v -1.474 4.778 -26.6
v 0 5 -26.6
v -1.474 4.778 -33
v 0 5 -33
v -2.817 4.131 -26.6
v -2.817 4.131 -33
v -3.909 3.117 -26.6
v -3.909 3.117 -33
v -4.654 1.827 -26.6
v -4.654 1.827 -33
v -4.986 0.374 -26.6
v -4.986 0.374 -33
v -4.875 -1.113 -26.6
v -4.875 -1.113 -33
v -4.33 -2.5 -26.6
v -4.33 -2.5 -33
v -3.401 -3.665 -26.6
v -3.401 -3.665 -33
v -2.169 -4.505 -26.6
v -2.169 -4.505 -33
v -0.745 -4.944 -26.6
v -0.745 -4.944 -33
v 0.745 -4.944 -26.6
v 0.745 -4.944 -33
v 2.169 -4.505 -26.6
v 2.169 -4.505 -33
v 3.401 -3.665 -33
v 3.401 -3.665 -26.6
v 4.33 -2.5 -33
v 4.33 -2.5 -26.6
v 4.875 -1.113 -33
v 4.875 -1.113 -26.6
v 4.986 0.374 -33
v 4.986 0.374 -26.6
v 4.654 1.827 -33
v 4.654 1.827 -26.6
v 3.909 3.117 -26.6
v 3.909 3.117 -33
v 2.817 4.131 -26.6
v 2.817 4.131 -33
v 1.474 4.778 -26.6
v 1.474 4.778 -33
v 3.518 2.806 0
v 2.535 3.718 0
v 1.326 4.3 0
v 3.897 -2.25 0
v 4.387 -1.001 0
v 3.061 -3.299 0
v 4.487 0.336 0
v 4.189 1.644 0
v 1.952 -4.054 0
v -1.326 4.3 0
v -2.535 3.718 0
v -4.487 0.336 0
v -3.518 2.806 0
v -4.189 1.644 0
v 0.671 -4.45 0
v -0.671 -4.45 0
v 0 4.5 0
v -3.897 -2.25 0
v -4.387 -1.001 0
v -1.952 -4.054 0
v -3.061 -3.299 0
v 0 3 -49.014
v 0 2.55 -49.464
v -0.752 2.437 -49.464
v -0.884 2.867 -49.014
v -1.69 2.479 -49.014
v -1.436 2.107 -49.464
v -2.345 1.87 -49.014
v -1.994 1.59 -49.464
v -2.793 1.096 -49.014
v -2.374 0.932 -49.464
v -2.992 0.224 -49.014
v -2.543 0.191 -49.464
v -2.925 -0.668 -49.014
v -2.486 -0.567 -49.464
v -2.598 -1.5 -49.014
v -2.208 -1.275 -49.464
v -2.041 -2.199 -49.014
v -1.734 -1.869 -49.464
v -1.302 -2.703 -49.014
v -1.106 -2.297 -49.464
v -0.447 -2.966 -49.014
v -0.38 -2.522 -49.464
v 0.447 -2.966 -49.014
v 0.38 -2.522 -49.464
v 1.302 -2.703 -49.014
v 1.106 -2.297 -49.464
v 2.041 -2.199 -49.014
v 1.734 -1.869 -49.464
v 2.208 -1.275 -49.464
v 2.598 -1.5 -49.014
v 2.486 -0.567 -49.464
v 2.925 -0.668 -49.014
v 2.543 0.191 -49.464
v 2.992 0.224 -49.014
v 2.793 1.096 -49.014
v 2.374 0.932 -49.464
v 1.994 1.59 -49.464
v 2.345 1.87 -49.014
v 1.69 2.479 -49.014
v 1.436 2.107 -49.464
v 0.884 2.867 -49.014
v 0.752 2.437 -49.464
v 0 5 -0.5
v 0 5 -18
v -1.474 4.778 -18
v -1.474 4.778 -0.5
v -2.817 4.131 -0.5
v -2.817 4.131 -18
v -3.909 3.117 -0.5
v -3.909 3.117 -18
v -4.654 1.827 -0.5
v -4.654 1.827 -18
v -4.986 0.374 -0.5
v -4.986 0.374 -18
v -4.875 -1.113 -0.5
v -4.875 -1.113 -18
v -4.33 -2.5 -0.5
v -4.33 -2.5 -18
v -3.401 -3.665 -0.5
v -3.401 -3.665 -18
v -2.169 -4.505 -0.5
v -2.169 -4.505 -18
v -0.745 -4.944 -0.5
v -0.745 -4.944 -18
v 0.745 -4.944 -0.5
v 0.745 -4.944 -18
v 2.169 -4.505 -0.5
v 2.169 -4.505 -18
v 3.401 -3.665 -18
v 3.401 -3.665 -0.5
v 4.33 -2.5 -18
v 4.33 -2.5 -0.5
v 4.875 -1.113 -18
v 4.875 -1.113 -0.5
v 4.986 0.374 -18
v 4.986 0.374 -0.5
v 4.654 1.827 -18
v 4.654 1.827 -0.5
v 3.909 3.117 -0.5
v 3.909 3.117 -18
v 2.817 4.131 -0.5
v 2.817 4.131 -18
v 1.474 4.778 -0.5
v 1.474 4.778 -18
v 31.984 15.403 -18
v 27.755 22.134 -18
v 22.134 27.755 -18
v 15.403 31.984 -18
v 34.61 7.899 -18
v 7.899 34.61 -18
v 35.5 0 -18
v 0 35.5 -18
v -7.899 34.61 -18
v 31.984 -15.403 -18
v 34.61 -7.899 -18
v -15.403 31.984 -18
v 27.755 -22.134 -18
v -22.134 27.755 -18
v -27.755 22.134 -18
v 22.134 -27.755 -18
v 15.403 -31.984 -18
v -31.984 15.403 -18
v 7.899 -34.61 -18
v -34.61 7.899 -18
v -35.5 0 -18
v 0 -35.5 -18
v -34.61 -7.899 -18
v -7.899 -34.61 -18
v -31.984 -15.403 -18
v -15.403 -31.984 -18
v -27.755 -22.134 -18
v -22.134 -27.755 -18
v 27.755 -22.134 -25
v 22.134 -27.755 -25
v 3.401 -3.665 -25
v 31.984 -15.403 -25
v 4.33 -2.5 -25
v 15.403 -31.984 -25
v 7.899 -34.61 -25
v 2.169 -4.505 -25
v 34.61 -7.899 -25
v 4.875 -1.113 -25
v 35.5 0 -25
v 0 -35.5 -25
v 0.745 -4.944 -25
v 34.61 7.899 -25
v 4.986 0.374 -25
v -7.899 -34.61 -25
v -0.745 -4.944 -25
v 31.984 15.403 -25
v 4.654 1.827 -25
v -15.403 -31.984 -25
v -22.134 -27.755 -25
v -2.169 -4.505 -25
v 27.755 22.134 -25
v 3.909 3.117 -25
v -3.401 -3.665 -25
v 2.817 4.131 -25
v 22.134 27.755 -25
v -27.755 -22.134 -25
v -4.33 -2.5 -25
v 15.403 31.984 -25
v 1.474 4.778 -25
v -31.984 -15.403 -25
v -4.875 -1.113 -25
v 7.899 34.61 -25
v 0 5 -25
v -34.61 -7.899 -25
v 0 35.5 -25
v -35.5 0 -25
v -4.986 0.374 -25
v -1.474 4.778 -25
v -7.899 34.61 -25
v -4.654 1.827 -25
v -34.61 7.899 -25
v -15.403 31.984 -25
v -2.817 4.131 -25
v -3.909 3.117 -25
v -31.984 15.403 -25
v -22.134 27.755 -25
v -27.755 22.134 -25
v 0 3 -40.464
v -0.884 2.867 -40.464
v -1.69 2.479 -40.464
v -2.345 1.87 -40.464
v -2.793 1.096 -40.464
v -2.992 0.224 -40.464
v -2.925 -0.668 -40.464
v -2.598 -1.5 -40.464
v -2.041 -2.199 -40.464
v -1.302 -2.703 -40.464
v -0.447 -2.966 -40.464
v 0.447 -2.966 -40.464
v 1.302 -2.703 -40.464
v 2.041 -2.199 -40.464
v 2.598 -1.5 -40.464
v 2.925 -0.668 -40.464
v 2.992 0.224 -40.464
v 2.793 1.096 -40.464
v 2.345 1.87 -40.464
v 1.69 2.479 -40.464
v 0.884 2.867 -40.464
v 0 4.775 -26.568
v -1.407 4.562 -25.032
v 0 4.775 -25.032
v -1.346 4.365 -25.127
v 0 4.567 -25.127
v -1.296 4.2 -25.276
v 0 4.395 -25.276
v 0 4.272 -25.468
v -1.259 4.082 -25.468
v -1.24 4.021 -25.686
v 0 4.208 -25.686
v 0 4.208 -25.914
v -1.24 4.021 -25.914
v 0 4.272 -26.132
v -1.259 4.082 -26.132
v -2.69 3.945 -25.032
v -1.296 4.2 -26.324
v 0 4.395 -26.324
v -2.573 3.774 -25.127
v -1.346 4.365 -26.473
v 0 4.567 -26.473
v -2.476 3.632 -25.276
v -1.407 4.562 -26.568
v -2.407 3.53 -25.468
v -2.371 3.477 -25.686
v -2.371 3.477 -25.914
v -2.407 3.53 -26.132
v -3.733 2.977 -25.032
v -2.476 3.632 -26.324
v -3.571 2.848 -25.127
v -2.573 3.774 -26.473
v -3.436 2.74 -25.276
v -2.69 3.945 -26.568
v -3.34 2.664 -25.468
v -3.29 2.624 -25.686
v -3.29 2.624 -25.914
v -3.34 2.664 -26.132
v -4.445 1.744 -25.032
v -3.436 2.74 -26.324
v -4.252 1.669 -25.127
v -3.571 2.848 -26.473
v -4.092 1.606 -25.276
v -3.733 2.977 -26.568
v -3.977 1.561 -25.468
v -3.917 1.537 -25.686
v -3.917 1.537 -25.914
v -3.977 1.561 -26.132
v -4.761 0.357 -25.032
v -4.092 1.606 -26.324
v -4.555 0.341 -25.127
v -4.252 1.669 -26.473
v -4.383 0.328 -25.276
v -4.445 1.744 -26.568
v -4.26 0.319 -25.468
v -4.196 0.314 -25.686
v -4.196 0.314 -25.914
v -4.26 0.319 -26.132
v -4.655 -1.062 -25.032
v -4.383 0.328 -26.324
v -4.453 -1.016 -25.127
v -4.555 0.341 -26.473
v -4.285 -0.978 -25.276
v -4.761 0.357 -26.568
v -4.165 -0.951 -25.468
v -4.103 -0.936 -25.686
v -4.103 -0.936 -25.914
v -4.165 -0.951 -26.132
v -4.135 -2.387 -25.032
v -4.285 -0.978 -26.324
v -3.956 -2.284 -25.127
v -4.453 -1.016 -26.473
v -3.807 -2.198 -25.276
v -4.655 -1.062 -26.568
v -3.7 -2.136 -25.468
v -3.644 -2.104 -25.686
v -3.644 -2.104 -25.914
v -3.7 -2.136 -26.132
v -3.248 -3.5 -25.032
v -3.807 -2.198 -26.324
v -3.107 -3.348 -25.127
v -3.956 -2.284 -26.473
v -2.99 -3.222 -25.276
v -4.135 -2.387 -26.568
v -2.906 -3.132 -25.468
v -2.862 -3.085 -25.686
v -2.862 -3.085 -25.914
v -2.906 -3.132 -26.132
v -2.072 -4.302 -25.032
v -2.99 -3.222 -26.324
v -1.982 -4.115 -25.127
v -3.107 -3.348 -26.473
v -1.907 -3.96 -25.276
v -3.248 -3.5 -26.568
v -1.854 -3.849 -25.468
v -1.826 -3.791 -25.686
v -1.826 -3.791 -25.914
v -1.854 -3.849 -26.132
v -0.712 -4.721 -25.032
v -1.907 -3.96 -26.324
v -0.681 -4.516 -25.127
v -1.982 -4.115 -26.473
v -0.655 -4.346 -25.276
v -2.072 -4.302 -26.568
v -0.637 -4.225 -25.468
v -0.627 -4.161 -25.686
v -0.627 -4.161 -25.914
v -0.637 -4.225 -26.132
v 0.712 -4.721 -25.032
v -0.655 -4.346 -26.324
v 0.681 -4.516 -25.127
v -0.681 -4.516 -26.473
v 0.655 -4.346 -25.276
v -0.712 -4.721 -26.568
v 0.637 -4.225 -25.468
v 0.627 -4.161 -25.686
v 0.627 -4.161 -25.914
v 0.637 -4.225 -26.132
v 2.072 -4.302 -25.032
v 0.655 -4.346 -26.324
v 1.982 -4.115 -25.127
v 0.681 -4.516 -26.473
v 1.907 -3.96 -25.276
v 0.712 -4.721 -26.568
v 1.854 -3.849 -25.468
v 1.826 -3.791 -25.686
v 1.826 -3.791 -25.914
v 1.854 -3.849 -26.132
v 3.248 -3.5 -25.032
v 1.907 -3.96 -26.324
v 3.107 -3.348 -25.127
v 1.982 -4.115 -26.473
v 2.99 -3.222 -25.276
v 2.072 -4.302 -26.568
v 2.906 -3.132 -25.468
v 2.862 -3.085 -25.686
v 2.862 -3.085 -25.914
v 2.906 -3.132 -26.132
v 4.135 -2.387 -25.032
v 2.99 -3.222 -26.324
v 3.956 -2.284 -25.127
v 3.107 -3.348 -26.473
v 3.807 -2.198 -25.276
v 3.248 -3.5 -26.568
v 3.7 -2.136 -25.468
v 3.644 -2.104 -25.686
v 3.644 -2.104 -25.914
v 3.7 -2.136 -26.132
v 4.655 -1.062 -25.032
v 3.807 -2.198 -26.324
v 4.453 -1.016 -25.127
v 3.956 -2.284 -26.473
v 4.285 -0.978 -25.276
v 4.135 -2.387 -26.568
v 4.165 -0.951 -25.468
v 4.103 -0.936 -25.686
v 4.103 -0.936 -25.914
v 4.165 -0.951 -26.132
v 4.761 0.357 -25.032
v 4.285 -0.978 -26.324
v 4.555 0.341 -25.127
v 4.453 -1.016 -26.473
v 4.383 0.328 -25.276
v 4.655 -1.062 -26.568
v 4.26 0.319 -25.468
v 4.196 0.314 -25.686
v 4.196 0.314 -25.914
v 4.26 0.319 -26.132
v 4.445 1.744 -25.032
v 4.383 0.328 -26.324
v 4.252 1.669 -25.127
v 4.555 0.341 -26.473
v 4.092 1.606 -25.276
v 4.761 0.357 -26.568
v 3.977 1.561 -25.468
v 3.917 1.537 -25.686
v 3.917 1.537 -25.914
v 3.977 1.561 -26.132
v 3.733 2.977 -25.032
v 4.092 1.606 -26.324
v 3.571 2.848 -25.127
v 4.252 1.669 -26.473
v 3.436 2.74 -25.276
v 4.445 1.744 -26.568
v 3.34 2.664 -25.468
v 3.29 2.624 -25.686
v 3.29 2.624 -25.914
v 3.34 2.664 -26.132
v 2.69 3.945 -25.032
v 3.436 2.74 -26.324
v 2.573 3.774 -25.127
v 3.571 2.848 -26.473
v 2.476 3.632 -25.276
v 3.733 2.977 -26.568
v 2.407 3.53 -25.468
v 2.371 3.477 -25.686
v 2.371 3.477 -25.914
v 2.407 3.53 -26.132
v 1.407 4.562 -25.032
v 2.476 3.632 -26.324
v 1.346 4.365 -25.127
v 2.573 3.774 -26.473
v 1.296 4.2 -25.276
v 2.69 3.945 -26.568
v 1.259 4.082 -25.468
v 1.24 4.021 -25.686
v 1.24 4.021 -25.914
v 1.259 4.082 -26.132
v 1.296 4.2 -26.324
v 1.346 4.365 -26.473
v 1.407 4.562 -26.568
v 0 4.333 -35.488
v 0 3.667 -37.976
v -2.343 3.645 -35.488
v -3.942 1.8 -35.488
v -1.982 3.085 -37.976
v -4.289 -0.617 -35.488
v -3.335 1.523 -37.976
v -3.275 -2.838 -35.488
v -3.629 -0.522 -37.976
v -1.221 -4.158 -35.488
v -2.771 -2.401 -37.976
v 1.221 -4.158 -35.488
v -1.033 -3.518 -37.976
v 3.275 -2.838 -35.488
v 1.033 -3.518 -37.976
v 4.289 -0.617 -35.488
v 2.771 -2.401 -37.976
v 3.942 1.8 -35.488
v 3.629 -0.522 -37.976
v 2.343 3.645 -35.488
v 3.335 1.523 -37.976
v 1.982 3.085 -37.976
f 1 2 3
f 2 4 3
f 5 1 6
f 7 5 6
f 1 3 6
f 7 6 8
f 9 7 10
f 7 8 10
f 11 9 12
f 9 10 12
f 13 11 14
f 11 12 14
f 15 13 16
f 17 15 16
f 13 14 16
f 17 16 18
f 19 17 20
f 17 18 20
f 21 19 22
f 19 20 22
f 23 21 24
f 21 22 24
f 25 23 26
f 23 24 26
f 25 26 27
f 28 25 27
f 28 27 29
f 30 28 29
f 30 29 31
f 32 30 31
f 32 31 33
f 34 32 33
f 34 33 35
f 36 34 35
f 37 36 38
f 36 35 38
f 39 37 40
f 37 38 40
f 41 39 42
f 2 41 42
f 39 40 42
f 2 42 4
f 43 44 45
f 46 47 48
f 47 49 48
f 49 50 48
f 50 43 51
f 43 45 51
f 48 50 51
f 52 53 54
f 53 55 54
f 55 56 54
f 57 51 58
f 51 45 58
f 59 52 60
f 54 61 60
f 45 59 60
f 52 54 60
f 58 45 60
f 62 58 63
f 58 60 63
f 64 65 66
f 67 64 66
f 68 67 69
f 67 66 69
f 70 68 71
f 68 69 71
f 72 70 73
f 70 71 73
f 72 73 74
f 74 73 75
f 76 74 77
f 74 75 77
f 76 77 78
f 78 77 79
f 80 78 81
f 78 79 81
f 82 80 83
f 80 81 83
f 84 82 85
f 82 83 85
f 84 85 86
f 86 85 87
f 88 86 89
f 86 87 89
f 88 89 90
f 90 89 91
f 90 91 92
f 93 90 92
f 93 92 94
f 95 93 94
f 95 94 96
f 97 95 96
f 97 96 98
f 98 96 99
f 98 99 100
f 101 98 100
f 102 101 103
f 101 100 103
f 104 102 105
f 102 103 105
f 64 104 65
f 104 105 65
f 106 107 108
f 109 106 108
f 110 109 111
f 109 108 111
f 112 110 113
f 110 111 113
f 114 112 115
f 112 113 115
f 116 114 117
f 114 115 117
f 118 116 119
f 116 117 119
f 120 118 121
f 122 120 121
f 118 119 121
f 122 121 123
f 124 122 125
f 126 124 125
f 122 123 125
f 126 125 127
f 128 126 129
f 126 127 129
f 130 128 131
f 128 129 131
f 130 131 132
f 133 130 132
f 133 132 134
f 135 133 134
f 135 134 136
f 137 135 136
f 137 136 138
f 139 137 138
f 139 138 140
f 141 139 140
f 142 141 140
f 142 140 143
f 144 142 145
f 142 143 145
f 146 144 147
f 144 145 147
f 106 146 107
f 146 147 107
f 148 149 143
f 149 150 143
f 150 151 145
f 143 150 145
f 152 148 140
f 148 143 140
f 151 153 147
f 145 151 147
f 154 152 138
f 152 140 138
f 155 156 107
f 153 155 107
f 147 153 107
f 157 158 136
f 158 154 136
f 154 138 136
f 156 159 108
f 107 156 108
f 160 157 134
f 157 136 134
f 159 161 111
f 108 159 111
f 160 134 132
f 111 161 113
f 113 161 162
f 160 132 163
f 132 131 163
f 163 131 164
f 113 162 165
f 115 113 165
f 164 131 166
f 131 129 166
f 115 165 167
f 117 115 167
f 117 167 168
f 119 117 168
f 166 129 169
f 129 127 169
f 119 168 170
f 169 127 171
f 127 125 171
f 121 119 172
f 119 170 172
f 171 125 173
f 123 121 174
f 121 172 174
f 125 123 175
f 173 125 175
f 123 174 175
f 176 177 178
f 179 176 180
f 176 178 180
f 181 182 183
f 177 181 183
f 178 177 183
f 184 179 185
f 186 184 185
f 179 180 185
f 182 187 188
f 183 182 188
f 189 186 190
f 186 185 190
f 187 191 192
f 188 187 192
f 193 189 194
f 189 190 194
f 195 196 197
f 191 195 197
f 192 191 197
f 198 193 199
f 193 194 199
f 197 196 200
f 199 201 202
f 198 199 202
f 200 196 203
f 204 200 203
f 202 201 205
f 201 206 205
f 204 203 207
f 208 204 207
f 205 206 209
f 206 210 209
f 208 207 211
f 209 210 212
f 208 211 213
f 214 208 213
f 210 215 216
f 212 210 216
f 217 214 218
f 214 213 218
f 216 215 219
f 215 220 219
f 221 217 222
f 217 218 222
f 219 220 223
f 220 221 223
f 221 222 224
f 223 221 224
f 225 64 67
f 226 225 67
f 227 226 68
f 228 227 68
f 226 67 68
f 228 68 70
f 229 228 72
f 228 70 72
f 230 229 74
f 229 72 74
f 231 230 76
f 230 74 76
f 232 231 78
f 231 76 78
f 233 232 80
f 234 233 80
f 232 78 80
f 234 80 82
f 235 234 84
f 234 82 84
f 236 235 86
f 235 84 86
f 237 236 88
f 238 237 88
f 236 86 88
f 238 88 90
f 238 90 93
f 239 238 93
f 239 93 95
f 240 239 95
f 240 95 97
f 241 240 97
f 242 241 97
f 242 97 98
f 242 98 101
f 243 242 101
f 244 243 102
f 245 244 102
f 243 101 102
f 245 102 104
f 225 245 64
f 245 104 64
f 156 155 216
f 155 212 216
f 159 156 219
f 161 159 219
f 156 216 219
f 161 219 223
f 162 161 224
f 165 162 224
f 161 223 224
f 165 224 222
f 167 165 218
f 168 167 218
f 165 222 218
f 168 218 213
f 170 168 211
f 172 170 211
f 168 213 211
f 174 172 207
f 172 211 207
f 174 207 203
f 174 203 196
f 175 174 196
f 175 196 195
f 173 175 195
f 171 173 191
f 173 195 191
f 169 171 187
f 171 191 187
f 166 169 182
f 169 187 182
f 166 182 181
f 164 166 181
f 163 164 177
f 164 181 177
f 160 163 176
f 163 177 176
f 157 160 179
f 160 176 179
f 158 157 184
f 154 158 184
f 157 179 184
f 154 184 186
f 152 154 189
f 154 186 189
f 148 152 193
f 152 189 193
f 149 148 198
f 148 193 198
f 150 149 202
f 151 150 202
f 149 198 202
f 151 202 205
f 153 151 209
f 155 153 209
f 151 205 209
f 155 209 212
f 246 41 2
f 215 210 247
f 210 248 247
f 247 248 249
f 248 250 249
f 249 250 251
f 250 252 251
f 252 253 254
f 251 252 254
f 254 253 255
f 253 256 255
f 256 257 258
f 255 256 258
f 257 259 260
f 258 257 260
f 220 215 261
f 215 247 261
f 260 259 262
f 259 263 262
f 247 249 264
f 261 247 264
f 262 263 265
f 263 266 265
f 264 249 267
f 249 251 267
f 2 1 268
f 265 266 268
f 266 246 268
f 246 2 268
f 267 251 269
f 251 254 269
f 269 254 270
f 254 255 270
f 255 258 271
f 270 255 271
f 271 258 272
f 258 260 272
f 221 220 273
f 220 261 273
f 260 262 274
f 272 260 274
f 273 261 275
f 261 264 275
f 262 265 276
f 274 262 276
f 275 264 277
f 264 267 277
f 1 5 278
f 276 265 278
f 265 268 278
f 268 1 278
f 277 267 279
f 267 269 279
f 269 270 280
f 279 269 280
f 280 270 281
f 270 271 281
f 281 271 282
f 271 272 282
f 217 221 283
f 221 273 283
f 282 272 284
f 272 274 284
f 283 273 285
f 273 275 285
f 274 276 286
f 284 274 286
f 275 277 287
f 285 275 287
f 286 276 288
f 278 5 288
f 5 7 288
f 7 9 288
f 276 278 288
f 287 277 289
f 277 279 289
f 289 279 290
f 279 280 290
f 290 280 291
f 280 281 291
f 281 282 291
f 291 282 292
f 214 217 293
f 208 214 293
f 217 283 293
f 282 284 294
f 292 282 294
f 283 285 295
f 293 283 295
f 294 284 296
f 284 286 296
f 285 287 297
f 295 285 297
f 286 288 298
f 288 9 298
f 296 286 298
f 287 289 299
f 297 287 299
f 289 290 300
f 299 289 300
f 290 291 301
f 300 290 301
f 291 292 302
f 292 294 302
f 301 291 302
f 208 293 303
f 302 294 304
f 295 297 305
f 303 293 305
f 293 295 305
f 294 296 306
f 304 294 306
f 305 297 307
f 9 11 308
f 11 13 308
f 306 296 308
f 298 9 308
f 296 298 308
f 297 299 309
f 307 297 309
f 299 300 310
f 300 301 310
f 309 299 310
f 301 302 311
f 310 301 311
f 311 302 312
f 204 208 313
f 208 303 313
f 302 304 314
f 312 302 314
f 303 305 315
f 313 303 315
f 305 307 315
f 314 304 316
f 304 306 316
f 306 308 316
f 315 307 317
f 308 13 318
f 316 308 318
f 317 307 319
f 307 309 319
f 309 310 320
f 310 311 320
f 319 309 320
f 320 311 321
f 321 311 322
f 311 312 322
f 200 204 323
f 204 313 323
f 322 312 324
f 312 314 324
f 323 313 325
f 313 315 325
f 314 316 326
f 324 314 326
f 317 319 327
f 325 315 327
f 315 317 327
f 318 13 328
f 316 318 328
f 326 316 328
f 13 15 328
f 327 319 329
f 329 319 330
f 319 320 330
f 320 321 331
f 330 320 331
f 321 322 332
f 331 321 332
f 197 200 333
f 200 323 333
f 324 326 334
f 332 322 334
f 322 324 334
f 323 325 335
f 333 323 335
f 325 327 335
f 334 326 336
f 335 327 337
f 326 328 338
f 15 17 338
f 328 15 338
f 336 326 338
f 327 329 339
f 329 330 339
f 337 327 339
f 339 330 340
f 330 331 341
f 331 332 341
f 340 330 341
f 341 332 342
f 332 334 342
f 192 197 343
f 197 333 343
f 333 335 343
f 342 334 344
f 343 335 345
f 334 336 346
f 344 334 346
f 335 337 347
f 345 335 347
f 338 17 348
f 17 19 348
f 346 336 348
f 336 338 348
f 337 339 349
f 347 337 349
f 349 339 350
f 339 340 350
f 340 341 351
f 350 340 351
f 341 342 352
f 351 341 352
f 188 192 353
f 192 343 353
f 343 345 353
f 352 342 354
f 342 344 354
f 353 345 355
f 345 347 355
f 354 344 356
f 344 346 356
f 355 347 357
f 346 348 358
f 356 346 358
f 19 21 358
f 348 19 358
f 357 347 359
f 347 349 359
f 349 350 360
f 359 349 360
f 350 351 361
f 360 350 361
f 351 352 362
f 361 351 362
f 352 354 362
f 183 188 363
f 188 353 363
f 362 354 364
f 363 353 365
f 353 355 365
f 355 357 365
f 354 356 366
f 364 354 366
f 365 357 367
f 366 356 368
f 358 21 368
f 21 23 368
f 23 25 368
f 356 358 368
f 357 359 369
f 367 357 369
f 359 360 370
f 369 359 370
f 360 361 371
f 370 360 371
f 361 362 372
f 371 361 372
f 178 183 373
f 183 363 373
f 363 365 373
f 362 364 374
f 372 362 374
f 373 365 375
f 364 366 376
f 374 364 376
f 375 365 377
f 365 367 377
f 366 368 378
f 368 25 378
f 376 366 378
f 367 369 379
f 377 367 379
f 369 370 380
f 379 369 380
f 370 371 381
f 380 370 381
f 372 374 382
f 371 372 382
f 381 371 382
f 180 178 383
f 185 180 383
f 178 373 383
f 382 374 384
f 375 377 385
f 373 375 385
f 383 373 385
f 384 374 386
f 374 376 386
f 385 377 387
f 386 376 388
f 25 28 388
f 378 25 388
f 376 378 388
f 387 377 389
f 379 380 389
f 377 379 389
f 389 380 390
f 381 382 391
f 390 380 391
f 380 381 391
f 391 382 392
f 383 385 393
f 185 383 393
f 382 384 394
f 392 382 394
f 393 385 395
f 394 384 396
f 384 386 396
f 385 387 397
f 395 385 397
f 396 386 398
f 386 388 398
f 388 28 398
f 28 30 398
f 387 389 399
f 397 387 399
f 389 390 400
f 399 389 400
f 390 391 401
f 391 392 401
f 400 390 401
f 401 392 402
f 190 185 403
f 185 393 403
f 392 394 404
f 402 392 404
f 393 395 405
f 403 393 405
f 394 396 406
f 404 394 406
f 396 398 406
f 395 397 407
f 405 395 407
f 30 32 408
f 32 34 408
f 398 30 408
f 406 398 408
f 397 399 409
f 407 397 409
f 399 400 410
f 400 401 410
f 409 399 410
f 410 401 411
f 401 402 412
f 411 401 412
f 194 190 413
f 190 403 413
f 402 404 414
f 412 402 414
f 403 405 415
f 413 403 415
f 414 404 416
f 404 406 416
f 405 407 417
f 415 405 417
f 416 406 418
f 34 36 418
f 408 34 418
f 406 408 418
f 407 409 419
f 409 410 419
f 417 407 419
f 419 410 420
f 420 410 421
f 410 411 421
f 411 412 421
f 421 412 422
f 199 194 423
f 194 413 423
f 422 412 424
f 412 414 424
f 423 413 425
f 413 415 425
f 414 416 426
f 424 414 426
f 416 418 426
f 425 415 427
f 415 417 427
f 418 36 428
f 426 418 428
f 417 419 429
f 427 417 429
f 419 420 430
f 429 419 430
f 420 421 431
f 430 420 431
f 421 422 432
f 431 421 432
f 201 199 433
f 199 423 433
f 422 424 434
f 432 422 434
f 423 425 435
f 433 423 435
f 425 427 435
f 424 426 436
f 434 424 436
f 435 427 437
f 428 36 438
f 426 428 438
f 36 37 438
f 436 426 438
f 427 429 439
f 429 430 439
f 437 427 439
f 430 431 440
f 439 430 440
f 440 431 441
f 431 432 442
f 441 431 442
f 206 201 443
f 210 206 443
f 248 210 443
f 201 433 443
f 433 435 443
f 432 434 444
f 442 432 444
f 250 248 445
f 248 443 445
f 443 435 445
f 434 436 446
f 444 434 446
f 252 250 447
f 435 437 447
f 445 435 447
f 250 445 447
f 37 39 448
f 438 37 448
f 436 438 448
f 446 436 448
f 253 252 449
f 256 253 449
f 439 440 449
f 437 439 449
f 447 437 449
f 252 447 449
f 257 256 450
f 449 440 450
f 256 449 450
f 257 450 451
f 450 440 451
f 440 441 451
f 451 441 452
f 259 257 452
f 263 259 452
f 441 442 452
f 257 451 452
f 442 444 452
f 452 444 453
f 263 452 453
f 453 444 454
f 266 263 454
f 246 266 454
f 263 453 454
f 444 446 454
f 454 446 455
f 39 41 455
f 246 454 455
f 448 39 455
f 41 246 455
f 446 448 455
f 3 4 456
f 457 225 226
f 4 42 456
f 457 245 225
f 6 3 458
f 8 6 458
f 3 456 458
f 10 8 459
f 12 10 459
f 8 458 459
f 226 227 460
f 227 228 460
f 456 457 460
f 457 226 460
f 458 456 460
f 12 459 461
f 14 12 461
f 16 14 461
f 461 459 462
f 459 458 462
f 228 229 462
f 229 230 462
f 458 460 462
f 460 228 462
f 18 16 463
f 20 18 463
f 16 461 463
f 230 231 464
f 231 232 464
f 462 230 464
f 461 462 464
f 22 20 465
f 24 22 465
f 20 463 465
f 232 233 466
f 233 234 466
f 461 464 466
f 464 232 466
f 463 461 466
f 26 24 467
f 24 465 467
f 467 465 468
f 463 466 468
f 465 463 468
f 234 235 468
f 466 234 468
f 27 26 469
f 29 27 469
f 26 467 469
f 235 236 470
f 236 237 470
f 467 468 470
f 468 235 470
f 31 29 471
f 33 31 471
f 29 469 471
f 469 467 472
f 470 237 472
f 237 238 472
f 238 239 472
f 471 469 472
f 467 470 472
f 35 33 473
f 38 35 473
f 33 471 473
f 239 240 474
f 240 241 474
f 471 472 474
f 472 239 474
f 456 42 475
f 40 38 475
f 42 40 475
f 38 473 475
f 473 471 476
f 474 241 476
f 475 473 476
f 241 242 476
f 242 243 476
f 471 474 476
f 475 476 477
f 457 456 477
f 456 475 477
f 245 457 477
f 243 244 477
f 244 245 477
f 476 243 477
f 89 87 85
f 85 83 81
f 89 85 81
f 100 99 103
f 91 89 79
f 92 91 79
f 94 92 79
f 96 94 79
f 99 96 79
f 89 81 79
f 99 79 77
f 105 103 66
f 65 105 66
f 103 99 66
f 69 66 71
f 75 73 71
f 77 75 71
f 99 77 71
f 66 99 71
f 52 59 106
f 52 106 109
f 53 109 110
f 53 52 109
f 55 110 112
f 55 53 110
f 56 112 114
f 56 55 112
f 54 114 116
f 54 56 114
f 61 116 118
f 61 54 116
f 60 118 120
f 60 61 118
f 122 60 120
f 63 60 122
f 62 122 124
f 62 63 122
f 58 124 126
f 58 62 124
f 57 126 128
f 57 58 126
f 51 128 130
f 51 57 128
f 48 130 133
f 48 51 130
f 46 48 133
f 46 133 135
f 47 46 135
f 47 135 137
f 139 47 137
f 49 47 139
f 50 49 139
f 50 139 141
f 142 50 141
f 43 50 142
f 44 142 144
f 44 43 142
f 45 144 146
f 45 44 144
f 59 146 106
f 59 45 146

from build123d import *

# Parameters (mm, degrees)
CHAFL_N1_SIZE = 0.45
CHAFL_N2_SIZE = 0.5


with BuildPart() as part:
    # Croquis1 → Revolución1 (revolve)
    with BuildSketch(Plane(origin=(0, 0, 0), x_dir=(0, 0, -1), z_dir=(1, 0, 0))):
        with BuildLine():
            Line((0, 0), (0, 5))
            Line((0, 5), (18, 5))
            Line((18, 5), (18, 35.5))
            Line((18, 35.5), (25, 35.5))
            Line((25, 35.5), (25, 5))
            ThreePointArc((25, 5), (25.8, 4.2), (26.6, 5))
            Line((26.6, 5), (33, 5))
            Line((33, 5), (40.464101615, 3))
            Line((40.464101615, 3), (49.464101615, 3))
            Line((49.464101615, 3), (49.464101615, 0))
            Line((49.464101615, 0), (0, 0))
        make_face()
    revolve(axis=Axis((0, 0, -49.464101615), (0, 0, 1)))

    # Chaflán1
    chafl_n1_edges = [part.edges().sort_by_distance(p)[0] for p in [
        (0, -3, -49.464101615),
    ]]
    chamfer(chafl_n1_edges, length=CHAFL_N1_SIZE)

    # Chaflán2
    chafl_n2_edges = [part.edges().sort_by_distance(p)[0] for p in [
        (0, -5, 0),
    ]]
    chamfer(chafl_n2_edges, length=CHAFL_N2_SIZE)


solid = part.part
